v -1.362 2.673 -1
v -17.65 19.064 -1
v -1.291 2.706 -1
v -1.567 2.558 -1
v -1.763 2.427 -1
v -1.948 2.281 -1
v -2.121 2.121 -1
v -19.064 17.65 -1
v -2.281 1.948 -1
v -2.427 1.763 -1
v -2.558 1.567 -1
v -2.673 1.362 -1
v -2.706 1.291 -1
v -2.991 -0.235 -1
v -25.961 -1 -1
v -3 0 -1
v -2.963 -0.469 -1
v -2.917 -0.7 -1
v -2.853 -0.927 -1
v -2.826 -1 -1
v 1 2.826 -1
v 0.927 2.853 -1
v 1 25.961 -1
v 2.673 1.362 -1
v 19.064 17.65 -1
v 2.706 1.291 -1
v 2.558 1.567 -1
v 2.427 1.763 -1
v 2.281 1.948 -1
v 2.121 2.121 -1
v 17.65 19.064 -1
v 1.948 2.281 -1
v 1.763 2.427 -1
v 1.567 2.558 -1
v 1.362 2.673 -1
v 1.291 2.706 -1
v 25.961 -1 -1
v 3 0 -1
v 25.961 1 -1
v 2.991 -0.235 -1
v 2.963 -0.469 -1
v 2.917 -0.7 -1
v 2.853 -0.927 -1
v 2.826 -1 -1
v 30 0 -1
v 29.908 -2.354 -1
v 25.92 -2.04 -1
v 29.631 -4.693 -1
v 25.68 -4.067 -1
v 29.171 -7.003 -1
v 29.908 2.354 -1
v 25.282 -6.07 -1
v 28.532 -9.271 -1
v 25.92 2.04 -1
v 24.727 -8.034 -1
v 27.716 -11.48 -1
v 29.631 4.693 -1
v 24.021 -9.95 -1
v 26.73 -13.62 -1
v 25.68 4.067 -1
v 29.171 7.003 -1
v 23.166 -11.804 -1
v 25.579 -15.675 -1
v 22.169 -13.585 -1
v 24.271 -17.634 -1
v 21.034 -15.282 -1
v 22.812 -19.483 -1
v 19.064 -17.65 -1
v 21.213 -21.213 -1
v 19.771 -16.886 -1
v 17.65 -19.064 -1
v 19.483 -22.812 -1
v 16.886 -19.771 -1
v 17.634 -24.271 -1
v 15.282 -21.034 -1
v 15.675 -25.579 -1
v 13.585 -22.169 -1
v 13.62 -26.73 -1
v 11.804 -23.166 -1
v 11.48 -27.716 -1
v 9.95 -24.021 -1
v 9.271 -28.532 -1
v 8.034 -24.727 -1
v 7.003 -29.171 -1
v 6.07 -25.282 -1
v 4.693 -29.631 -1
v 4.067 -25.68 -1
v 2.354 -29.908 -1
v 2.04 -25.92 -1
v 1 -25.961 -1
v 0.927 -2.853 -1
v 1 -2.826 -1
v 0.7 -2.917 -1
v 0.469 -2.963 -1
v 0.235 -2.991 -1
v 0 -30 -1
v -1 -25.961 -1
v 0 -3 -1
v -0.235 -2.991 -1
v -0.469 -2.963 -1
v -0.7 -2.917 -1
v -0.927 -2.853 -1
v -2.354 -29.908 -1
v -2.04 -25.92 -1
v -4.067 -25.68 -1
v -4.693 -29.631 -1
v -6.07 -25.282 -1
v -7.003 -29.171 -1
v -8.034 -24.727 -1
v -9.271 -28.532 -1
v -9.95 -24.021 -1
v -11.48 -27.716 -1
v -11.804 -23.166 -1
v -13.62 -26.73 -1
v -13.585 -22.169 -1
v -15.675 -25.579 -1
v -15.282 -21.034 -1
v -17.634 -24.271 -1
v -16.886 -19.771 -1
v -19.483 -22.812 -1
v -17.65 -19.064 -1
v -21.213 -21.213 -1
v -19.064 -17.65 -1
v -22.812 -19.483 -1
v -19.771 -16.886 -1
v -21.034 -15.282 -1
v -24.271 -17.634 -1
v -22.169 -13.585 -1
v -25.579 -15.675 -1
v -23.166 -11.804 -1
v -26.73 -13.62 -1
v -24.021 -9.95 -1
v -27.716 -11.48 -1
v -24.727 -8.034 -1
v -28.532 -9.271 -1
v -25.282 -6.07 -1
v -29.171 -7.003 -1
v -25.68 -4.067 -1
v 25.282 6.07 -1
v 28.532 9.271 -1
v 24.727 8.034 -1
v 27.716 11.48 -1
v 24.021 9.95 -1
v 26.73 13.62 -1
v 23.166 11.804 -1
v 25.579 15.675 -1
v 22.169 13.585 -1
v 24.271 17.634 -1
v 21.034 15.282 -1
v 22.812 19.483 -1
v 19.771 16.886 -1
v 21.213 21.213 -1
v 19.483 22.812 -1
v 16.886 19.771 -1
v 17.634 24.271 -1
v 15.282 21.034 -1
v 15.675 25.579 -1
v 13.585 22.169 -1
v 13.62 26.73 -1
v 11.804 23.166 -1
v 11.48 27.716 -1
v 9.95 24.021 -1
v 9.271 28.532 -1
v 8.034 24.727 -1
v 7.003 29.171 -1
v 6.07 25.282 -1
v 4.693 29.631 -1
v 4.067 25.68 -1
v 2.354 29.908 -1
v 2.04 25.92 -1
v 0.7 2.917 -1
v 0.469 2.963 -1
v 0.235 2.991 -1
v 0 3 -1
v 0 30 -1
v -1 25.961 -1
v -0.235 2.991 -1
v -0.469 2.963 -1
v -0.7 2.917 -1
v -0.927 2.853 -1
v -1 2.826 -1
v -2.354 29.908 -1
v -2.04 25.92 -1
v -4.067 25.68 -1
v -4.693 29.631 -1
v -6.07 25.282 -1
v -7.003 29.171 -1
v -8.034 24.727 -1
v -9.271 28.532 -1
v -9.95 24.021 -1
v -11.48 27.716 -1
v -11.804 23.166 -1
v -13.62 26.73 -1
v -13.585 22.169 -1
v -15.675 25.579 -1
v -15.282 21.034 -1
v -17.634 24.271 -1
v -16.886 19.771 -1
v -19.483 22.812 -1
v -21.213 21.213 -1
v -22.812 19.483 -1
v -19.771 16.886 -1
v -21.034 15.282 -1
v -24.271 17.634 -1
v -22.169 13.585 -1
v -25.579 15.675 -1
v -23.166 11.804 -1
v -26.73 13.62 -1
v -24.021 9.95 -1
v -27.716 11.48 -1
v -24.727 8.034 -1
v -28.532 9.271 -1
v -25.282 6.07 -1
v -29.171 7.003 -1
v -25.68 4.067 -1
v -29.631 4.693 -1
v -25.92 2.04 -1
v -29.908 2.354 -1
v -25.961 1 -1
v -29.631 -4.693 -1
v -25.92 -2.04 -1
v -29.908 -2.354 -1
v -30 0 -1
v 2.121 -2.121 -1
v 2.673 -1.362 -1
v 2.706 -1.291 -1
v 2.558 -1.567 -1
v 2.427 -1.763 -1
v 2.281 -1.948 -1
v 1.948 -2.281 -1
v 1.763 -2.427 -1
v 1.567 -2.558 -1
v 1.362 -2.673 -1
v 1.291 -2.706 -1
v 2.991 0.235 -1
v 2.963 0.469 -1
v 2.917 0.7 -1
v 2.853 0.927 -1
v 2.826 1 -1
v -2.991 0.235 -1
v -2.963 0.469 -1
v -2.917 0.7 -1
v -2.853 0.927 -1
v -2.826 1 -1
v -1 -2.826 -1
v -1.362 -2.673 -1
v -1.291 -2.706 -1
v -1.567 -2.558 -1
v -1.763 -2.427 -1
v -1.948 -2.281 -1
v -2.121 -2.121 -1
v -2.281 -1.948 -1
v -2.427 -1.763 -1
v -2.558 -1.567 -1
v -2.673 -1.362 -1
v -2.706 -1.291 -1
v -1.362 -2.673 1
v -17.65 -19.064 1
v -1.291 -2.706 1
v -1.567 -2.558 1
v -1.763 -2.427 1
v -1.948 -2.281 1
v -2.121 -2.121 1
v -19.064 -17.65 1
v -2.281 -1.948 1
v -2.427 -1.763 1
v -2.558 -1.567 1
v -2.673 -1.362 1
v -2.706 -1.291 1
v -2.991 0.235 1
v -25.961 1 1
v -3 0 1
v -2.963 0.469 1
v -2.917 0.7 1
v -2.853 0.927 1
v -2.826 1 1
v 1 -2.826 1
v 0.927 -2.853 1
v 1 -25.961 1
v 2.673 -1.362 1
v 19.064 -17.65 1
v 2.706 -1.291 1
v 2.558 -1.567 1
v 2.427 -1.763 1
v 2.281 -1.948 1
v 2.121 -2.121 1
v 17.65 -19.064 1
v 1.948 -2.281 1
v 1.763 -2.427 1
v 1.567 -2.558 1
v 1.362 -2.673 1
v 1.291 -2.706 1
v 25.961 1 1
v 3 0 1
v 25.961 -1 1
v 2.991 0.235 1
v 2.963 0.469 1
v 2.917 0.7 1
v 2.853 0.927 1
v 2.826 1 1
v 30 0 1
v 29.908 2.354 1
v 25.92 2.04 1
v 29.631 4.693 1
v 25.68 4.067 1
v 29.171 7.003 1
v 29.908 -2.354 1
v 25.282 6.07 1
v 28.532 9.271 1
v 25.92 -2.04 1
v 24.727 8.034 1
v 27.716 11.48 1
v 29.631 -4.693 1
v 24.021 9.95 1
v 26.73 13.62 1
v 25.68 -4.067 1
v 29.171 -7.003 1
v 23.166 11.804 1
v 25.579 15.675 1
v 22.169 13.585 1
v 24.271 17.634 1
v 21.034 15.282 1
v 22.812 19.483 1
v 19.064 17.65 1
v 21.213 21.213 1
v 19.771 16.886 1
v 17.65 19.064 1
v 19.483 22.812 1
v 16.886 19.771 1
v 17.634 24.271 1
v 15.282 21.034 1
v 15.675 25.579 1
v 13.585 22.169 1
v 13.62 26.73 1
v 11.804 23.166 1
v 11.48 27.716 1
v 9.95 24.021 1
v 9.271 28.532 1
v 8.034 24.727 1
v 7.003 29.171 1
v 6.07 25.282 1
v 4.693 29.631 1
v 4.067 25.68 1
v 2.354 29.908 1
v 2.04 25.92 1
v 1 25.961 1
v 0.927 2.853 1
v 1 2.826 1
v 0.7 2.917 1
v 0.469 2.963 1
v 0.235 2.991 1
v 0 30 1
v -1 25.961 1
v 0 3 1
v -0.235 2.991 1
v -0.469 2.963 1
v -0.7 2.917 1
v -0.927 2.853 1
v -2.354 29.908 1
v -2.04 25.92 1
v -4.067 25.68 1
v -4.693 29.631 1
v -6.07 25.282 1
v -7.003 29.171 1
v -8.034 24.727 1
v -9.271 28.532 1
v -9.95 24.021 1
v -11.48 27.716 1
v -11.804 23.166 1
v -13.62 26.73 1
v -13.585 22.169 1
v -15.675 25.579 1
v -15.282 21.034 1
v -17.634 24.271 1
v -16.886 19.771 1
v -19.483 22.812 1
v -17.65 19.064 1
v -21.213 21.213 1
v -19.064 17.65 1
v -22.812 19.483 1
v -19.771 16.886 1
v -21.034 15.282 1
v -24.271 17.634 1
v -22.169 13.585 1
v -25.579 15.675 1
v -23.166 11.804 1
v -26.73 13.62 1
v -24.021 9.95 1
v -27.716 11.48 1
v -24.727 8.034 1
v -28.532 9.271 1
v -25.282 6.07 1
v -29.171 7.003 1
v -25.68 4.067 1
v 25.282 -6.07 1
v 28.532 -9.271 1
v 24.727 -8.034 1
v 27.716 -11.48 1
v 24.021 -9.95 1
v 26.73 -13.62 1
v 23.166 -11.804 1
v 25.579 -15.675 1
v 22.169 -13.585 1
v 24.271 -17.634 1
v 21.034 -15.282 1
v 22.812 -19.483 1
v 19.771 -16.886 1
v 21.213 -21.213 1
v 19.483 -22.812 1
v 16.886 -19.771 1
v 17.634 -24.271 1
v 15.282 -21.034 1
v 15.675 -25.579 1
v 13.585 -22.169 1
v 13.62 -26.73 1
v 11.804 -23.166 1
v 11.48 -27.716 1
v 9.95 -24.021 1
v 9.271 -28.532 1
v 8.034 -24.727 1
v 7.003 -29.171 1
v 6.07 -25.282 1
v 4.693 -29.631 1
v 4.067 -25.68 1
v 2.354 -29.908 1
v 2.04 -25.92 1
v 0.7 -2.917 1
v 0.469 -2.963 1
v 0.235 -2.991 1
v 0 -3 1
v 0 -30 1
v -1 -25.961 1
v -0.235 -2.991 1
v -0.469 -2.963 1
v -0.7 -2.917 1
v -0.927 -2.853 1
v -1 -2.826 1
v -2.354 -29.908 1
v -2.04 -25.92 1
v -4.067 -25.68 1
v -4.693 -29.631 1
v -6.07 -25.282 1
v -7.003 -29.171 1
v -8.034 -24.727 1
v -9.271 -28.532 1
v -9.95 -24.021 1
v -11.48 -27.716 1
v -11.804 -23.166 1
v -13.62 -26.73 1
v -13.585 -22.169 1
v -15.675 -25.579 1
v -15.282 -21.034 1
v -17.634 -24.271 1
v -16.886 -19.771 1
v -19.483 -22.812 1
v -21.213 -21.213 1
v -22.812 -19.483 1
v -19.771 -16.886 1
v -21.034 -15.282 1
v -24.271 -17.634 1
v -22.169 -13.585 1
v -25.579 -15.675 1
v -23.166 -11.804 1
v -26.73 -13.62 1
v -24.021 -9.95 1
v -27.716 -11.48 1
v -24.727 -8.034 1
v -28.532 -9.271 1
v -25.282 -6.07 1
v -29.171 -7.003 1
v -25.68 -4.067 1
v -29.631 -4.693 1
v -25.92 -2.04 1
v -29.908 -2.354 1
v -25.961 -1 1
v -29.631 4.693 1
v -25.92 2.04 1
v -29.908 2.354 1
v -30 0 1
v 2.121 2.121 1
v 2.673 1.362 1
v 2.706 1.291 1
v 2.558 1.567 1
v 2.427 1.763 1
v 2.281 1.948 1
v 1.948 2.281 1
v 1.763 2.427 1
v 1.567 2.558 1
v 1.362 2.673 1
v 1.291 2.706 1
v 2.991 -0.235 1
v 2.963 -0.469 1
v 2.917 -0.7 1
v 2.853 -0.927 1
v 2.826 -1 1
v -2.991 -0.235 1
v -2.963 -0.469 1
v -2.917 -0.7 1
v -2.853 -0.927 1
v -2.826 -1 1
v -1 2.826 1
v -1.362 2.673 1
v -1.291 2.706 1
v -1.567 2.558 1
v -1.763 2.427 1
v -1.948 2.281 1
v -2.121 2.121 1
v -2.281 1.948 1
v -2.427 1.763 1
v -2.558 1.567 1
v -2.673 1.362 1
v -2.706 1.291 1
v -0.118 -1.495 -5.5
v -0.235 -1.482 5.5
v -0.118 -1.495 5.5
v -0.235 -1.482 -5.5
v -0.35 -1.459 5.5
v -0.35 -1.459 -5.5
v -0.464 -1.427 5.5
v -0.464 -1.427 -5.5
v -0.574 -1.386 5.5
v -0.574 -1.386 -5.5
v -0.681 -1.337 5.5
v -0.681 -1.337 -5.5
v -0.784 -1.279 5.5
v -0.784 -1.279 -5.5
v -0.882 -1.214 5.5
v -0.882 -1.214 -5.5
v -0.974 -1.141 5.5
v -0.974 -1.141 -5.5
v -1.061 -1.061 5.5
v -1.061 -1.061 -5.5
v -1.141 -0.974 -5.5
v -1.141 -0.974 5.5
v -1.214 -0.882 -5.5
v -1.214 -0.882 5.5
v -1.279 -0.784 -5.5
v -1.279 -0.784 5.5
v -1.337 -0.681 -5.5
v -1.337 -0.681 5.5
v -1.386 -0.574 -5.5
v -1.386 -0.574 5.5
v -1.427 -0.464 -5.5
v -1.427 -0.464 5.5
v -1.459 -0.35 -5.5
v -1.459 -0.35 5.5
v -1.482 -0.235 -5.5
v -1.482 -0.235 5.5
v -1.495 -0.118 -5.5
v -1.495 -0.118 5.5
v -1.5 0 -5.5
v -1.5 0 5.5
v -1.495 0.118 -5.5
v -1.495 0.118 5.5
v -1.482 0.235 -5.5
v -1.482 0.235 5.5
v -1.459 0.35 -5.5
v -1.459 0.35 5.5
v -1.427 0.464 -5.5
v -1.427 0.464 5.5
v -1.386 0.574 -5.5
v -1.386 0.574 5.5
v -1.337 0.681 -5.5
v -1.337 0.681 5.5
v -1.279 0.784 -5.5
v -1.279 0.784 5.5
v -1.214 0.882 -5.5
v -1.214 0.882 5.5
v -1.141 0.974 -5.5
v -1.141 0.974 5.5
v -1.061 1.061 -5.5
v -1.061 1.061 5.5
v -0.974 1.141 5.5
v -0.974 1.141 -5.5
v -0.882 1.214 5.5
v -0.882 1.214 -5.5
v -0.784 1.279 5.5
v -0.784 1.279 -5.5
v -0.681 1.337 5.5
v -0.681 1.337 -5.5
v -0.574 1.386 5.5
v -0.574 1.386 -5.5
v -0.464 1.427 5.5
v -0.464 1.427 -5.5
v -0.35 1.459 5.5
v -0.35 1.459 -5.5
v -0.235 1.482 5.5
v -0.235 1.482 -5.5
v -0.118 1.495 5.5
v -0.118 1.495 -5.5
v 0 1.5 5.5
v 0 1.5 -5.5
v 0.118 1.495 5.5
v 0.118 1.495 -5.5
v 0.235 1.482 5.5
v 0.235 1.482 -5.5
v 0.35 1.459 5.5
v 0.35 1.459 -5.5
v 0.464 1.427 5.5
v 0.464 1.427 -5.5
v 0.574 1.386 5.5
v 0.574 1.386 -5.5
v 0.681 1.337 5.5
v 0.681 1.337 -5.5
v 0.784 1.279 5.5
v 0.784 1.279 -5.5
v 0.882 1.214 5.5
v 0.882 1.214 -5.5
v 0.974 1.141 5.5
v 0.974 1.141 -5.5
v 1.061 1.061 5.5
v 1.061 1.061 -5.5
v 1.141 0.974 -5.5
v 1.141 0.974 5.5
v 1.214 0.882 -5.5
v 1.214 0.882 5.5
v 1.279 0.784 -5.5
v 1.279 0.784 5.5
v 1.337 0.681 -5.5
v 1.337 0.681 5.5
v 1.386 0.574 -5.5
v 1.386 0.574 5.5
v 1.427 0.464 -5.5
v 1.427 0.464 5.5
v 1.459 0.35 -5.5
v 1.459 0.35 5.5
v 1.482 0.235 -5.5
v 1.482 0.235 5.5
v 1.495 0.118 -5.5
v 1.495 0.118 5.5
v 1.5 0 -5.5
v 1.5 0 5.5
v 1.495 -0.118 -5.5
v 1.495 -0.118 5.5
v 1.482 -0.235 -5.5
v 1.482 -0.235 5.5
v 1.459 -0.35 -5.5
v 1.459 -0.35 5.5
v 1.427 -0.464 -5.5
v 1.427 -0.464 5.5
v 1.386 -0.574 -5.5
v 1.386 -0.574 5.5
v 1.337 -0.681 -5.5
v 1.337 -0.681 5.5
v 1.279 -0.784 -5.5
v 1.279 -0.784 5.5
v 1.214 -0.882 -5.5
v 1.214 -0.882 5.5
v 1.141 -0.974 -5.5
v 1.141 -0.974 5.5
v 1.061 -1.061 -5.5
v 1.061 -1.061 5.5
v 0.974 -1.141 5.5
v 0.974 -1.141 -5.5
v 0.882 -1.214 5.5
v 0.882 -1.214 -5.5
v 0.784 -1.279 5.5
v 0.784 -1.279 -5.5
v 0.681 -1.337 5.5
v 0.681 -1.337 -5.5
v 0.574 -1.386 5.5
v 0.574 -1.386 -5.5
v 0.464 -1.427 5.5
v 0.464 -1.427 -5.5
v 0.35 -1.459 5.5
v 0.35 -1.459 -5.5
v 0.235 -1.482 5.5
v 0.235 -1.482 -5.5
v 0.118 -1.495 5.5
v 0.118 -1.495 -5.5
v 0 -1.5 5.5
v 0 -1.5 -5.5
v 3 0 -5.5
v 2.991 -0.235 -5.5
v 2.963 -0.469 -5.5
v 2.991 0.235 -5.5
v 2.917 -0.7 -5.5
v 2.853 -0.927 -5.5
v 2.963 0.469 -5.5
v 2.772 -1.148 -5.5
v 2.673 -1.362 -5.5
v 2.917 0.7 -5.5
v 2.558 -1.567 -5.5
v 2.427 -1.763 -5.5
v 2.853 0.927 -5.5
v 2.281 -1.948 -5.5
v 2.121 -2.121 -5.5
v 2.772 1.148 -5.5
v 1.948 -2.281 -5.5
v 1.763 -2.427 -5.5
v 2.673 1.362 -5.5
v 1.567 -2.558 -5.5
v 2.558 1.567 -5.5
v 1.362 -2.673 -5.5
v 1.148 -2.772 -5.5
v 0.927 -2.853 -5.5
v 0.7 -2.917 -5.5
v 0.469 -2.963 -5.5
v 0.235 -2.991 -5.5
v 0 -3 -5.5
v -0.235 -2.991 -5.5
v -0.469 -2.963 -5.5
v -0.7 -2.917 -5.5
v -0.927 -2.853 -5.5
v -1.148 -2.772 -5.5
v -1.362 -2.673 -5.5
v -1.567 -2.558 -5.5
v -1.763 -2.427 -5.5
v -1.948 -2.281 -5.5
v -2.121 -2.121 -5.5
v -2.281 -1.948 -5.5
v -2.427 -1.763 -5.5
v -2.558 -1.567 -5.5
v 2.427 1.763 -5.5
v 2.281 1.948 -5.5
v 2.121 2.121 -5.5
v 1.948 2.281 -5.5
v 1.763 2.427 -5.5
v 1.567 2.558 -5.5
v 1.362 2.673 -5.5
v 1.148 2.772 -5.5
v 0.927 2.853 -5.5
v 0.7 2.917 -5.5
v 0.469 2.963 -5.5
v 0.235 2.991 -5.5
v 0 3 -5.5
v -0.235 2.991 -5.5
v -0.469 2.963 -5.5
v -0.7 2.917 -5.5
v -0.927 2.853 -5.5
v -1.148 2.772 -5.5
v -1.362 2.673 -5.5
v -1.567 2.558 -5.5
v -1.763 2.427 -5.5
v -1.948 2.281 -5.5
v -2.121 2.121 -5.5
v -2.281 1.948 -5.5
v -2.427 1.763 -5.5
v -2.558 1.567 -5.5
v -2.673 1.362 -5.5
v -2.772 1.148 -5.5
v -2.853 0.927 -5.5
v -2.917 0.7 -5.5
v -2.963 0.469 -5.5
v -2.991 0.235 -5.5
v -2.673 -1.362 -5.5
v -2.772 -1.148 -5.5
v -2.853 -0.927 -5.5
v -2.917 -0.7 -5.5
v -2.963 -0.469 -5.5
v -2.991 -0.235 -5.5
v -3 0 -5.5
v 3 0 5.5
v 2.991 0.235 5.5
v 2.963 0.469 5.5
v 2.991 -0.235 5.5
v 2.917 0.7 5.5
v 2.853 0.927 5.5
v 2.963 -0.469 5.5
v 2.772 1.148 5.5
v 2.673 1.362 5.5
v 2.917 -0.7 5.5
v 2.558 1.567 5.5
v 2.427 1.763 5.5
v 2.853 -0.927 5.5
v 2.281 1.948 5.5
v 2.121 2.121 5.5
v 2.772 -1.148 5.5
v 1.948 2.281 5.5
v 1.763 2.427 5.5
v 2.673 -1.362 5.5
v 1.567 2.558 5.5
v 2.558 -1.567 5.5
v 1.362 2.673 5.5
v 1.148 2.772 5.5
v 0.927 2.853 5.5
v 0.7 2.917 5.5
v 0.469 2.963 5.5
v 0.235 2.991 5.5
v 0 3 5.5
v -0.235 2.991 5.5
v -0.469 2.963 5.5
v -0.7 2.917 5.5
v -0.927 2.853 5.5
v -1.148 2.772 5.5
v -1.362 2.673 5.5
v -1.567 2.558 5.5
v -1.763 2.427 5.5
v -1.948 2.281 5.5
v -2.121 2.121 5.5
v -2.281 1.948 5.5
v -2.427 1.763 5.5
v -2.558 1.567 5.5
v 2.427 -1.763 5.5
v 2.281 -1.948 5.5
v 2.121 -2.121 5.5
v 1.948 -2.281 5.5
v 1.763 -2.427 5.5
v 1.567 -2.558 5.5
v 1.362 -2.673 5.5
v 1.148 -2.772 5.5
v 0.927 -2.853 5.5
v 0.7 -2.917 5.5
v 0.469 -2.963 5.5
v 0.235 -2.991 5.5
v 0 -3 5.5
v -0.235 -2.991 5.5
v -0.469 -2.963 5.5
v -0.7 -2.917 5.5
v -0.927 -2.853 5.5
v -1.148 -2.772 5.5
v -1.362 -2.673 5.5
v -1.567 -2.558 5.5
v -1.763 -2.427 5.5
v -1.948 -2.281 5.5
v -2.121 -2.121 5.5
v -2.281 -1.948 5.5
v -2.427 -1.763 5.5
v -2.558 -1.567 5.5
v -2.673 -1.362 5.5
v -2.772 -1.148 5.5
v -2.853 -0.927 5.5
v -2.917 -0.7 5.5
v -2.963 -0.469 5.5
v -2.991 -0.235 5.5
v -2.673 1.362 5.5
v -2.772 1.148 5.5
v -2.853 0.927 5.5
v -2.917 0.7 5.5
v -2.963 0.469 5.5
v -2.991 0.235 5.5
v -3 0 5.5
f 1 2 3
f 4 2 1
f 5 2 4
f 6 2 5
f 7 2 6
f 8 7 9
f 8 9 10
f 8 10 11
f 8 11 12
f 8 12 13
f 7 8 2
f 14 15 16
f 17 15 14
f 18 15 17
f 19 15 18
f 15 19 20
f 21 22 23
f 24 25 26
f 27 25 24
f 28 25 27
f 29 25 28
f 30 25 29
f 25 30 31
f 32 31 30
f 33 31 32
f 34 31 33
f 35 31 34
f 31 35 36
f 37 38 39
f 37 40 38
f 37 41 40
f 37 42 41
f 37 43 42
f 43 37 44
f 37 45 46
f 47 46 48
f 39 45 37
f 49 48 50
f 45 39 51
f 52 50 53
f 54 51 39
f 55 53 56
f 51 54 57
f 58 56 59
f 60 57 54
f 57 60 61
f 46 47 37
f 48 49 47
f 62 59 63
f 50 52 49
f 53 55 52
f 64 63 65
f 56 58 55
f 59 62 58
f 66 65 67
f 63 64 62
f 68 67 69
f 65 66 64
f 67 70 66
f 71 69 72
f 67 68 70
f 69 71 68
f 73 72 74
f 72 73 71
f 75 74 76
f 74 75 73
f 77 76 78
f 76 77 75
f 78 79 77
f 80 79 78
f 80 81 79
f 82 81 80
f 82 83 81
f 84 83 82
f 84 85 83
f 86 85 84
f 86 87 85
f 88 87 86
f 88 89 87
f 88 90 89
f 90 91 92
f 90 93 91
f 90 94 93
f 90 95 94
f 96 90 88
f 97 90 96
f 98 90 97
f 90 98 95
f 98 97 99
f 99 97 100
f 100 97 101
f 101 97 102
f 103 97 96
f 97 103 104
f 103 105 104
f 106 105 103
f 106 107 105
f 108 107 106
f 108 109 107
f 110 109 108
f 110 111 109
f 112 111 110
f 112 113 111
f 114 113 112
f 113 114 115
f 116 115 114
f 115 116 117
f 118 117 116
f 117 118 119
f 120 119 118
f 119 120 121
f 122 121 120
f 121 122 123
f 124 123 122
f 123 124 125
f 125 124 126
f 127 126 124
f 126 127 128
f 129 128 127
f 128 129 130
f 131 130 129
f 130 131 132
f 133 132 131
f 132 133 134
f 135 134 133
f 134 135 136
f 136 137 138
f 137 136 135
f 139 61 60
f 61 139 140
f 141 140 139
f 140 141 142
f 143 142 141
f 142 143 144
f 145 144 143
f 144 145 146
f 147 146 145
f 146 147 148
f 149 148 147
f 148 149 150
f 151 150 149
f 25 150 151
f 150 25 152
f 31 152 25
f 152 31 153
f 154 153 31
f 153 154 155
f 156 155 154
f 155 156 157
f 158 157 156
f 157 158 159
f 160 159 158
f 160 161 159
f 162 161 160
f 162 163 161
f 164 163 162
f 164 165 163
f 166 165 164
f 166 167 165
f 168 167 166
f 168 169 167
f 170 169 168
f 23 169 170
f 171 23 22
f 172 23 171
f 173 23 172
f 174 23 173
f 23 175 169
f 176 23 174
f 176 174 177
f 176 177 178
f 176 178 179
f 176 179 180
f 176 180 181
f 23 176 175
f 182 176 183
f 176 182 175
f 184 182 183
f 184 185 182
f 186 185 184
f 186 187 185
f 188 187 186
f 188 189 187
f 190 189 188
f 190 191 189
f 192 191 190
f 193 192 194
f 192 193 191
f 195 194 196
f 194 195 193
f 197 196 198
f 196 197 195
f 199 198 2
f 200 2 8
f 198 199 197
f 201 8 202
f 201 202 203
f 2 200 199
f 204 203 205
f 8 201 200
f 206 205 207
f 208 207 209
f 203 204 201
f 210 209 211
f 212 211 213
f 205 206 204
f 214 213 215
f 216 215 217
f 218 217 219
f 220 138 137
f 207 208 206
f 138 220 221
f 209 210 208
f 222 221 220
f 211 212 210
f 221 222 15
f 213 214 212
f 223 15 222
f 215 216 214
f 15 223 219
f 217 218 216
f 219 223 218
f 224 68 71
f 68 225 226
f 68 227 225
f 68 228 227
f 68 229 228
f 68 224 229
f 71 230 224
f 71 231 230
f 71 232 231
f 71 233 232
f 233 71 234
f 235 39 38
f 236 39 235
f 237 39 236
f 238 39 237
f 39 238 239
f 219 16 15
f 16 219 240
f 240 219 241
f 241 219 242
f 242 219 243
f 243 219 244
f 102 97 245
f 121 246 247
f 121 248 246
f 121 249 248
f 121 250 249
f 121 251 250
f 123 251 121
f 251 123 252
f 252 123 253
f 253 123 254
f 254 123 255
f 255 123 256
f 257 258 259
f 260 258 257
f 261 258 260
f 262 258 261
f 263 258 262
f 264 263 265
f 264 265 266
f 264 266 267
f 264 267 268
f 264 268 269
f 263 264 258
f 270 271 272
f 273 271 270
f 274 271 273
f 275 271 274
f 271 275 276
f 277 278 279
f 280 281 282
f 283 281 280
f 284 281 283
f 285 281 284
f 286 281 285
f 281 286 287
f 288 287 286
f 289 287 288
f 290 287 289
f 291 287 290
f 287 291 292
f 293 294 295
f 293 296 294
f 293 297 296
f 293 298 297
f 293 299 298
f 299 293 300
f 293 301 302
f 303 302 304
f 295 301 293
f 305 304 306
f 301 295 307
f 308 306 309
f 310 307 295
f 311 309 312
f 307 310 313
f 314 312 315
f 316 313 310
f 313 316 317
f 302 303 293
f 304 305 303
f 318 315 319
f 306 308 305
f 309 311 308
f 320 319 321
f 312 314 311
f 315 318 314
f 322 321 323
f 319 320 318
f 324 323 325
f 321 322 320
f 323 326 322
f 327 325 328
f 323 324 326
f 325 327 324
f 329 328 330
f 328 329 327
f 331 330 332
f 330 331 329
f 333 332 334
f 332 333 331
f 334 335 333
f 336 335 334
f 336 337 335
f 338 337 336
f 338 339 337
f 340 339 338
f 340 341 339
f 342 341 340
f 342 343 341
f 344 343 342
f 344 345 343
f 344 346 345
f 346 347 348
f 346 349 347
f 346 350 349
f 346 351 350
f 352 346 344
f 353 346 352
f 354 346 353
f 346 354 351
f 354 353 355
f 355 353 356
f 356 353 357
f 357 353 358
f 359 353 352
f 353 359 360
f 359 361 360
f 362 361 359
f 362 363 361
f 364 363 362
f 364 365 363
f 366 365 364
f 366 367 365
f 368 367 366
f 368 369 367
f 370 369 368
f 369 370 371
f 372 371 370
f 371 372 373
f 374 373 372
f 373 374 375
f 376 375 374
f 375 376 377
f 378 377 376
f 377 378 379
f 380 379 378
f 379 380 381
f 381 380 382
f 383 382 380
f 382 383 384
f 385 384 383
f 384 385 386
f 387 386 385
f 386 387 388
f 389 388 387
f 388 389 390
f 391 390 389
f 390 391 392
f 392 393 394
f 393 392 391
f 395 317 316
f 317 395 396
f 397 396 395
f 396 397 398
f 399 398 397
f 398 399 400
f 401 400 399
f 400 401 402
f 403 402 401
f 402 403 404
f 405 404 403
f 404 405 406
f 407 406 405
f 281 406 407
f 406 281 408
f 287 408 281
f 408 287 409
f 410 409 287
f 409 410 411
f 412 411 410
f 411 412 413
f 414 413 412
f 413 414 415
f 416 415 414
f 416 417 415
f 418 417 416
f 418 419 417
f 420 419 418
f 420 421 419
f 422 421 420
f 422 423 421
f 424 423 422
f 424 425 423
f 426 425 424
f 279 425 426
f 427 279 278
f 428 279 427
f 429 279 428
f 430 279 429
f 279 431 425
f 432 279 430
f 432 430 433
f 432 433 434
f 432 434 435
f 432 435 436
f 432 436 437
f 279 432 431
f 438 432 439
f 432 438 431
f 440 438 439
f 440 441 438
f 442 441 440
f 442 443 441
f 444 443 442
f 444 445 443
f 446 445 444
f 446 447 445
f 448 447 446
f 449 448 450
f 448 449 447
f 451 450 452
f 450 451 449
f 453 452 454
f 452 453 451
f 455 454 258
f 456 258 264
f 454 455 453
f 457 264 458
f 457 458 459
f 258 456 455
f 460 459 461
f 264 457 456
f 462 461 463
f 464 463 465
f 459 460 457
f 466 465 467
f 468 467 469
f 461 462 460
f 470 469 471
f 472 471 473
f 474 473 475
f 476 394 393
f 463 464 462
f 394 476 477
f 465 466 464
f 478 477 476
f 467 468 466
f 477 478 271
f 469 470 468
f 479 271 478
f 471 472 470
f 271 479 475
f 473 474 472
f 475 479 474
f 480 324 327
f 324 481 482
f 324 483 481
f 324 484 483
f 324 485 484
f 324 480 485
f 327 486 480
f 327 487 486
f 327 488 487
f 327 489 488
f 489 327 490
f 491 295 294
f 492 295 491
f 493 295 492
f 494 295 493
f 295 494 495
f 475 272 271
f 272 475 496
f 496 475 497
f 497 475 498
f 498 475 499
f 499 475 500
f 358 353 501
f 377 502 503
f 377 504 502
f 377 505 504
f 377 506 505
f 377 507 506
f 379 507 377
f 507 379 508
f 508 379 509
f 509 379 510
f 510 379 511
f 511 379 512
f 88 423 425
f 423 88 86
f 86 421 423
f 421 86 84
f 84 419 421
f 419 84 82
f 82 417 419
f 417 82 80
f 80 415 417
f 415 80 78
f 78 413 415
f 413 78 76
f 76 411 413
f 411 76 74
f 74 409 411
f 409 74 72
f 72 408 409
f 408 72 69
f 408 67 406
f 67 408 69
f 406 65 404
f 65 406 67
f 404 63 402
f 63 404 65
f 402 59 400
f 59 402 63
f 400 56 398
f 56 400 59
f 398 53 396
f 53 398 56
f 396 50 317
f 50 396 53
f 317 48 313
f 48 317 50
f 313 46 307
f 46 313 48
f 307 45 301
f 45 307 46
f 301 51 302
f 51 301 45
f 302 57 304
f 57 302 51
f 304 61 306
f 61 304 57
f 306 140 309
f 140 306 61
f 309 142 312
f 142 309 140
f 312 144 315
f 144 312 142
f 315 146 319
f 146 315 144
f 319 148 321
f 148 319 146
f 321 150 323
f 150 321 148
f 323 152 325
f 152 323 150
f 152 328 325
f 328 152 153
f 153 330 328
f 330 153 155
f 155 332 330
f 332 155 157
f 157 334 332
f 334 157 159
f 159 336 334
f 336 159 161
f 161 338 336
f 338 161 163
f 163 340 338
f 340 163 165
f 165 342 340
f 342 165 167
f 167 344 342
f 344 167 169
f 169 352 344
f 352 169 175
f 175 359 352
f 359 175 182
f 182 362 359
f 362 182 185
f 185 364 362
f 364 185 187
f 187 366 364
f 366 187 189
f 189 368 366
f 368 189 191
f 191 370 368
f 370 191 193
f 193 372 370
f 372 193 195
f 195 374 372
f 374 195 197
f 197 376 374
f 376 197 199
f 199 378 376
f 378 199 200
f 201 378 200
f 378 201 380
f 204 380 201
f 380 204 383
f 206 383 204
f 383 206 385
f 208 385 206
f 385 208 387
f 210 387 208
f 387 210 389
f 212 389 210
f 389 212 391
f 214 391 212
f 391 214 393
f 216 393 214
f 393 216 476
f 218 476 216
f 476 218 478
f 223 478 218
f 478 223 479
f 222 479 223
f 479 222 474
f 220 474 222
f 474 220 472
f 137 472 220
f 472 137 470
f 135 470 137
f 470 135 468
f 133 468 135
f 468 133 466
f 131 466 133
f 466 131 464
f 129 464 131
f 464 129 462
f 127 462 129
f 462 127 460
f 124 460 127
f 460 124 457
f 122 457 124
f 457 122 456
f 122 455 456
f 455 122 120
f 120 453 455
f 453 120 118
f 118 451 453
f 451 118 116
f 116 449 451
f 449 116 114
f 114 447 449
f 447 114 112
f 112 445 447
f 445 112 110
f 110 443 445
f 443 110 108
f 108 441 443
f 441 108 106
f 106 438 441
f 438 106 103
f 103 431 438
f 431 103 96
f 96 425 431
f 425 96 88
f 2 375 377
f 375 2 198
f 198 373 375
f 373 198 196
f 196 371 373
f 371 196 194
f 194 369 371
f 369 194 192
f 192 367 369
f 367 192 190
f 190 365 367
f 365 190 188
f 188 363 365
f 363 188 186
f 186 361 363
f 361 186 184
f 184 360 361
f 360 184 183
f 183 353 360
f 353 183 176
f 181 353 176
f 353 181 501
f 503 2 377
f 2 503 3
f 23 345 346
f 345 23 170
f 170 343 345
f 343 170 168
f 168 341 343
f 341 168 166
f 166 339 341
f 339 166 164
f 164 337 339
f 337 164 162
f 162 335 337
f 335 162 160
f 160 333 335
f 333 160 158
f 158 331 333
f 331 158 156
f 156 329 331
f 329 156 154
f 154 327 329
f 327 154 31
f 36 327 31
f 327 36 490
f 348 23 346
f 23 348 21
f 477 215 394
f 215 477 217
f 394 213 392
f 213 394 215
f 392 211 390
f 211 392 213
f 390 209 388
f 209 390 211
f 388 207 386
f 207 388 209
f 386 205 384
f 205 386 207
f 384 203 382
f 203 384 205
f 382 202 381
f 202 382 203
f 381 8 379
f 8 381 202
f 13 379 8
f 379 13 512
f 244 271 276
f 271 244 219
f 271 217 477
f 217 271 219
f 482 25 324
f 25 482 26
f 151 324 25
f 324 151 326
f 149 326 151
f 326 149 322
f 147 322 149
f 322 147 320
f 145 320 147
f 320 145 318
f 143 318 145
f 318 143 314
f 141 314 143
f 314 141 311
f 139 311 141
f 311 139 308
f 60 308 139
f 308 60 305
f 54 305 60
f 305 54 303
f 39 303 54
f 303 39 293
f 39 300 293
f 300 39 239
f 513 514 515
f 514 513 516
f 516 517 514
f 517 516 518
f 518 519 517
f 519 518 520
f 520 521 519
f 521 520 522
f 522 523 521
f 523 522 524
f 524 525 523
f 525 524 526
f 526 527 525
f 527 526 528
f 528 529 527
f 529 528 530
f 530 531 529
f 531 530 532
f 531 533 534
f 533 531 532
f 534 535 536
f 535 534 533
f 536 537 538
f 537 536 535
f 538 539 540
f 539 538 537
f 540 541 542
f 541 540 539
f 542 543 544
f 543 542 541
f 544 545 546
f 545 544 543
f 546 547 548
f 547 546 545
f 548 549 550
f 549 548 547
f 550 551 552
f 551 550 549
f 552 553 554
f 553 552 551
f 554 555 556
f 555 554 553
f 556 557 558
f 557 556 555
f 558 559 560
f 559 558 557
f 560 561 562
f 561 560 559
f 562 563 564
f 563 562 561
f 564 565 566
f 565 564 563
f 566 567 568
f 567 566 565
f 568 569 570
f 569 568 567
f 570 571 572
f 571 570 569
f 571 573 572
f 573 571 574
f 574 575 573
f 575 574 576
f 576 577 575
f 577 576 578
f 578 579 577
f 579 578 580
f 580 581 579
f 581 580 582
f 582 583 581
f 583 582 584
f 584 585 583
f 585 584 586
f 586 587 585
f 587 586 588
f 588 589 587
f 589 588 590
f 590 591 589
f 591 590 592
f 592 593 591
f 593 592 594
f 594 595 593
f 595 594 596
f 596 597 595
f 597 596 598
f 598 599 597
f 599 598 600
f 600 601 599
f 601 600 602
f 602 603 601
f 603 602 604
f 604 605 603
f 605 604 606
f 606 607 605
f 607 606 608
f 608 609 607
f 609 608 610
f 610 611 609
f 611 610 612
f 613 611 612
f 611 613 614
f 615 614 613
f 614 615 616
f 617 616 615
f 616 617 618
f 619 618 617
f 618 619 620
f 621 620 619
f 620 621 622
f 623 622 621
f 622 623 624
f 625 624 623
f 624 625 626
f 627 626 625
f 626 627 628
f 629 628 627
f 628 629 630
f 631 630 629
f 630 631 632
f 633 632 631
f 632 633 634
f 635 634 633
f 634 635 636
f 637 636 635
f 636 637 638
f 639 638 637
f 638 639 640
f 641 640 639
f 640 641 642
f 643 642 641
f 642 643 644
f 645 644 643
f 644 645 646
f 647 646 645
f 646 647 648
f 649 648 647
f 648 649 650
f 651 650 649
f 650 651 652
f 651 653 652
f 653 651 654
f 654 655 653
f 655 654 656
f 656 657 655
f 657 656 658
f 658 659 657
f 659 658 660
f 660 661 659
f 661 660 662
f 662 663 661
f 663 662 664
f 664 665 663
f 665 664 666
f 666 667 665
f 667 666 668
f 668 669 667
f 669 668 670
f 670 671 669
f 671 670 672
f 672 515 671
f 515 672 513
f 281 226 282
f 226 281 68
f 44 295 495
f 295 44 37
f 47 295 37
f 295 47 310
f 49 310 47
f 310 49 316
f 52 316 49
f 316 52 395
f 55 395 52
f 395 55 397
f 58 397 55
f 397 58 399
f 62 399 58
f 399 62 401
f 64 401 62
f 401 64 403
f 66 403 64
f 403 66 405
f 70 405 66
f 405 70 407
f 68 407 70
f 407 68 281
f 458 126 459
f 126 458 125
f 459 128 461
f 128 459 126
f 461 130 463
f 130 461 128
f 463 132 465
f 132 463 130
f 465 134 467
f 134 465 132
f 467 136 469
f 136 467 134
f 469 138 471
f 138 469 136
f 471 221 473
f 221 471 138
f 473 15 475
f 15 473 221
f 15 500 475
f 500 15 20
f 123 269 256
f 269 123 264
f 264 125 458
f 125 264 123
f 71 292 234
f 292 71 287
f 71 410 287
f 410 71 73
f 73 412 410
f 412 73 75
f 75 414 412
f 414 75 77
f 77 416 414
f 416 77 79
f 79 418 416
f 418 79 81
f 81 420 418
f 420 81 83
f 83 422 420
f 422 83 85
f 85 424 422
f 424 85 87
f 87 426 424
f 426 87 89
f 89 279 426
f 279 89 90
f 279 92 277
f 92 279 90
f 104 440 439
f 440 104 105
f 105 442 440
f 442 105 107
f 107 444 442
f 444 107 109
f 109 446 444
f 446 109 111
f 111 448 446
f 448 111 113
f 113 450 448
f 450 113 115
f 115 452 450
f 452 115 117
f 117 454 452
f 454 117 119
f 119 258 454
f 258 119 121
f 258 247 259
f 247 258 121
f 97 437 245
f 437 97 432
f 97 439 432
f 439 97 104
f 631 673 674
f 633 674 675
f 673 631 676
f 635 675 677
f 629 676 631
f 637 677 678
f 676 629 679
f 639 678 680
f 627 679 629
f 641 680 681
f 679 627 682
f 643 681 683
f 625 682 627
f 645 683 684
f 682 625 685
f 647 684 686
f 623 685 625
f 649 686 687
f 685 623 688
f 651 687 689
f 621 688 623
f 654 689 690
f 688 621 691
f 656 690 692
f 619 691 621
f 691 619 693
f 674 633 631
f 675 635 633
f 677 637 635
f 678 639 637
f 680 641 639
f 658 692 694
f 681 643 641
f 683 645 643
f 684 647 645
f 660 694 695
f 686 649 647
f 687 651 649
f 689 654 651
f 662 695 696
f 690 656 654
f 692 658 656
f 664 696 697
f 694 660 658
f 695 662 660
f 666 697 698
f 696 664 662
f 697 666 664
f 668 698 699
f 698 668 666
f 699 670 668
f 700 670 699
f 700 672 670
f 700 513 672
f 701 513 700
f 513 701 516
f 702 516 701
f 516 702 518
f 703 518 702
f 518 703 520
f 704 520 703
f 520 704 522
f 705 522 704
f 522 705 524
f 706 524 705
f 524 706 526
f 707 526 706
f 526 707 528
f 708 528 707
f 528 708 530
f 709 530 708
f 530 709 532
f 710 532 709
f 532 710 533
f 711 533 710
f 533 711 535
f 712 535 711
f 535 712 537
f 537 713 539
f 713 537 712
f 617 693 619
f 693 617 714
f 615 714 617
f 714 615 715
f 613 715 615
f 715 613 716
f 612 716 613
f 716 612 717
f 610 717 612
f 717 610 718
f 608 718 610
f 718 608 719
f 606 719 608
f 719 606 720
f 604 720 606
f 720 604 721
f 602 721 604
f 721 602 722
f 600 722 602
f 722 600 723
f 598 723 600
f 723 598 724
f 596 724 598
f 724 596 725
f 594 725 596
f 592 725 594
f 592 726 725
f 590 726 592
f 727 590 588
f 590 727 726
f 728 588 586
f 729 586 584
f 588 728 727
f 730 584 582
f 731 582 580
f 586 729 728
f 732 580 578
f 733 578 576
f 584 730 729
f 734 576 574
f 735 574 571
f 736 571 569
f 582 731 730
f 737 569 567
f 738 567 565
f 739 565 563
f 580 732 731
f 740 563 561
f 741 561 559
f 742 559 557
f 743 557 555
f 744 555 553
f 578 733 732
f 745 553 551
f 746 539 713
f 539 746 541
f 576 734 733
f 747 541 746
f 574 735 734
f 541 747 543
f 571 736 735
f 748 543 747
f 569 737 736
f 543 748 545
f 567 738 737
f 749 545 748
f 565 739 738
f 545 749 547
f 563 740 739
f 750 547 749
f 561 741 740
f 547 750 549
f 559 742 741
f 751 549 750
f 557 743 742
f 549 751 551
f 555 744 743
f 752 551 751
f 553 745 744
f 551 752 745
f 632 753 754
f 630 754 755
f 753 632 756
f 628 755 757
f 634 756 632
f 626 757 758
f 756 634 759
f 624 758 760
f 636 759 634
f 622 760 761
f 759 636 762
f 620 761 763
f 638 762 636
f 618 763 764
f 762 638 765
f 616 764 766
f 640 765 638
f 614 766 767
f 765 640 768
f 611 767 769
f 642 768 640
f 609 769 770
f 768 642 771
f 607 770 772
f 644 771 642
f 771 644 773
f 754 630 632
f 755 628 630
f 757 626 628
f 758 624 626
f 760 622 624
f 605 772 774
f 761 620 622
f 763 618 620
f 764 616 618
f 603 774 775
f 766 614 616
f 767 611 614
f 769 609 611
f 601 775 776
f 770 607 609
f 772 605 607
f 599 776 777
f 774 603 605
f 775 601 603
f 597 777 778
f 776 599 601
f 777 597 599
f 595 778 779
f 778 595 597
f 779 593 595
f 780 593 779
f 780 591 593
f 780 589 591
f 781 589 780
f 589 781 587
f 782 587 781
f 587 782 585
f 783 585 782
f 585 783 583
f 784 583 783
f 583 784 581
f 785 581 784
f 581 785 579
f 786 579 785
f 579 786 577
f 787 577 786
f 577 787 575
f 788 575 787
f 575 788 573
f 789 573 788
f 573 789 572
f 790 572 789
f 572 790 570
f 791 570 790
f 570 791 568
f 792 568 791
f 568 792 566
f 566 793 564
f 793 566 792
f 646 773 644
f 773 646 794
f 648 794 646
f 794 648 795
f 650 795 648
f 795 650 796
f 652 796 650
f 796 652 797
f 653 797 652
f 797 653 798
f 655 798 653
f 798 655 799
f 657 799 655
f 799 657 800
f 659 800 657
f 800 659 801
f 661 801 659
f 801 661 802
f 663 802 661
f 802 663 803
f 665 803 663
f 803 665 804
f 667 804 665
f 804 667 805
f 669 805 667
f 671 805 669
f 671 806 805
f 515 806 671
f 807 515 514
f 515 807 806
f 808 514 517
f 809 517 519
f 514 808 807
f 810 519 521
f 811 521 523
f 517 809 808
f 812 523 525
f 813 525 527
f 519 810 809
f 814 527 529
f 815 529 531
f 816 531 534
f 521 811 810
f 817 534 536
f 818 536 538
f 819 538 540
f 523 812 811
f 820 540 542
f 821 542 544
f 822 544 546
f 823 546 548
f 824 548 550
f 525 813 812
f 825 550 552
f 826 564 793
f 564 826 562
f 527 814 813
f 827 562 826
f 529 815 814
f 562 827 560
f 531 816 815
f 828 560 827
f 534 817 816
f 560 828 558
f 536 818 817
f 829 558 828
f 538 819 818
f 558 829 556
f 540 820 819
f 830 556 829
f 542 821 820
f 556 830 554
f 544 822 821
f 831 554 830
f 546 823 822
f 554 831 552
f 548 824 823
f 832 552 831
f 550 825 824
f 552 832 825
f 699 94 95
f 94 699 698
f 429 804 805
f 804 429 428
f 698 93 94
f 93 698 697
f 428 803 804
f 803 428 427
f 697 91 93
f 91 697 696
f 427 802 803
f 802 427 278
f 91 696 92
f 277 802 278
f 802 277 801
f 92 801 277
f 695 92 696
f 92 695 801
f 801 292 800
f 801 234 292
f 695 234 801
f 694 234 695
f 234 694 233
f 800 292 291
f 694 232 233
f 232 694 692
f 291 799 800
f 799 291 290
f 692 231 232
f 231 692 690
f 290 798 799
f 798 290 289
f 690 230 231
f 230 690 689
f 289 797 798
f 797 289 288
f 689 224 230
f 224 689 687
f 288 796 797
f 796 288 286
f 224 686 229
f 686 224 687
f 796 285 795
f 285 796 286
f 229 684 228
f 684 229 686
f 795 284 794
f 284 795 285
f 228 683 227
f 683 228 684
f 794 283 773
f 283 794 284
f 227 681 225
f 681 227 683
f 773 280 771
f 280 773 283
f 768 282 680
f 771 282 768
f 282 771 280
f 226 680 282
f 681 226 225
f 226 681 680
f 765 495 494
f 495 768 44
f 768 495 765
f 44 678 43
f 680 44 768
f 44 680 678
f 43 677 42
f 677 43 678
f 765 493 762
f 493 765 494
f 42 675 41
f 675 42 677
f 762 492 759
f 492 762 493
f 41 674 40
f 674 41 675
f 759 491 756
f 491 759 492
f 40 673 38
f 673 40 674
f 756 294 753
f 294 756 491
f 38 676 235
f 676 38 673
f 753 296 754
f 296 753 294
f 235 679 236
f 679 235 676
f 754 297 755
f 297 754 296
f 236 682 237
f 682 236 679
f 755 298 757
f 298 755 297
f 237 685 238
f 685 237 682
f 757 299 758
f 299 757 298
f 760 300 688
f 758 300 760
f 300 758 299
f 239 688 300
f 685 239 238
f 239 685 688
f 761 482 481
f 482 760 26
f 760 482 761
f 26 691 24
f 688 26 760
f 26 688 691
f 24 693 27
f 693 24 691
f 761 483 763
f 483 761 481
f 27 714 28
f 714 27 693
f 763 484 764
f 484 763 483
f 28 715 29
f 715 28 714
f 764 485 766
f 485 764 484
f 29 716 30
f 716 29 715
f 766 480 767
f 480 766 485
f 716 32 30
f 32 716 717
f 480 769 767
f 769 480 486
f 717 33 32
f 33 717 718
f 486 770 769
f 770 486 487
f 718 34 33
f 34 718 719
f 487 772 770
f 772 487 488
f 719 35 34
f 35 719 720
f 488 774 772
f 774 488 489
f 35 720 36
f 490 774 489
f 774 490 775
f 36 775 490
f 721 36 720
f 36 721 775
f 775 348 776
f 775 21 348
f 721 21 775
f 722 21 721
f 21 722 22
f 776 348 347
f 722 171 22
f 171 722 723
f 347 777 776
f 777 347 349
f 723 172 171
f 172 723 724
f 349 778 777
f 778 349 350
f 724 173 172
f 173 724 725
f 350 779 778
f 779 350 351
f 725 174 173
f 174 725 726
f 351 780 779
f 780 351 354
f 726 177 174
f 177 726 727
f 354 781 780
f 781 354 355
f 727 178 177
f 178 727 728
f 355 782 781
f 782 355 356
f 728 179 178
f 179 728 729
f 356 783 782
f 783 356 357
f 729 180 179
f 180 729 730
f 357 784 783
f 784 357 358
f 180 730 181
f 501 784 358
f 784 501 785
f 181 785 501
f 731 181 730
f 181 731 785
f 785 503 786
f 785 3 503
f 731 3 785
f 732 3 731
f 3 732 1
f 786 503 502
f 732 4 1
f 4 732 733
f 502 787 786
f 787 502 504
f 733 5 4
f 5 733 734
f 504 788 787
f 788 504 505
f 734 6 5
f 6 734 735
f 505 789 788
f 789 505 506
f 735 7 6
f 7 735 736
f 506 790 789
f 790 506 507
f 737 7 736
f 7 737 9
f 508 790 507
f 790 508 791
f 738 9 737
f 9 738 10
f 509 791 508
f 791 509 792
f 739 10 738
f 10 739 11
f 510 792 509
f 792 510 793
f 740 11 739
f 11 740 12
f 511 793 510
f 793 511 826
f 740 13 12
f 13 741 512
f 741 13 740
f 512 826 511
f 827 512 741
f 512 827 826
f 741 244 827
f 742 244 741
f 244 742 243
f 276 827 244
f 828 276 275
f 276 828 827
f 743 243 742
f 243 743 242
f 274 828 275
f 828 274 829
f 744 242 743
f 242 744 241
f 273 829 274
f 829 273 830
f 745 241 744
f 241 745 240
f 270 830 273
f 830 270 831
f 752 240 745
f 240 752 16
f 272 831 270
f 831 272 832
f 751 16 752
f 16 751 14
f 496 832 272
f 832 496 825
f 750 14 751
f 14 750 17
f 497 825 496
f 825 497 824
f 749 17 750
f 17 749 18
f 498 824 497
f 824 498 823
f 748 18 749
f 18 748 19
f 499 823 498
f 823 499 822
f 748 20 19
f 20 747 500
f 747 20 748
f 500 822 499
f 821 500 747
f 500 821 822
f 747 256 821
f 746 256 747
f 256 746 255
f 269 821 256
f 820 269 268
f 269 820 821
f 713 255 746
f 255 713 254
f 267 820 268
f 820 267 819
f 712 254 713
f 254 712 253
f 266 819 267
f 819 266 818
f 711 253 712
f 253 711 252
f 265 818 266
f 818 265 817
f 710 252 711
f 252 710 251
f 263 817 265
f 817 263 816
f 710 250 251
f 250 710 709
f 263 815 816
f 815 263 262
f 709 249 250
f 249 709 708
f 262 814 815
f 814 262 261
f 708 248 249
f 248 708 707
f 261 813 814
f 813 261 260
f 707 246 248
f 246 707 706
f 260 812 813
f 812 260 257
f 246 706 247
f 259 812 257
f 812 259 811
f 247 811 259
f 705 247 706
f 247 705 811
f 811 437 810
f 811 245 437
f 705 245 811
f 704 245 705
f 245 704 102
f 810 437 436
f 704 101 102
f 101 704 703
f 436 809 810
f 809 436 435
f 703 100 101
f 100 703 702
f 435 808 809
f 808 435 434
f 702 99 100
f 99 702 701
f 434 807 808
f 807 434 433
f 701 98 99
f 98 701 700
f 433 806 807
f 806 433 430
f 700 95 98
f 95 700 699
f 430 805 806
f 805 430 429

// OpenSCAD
//!OpenSCAD







linear_extrude( height=2, twist=0, scale=[1, 1], center=true, $fn=80){
    wheel();
}

linear_extrude( height=11, twist=0, scale=[1, 1], center=true, $fn=80){
   hook();
}


module hook(){
    difference(){
    circle(d=6);
    circle(d=3);
    }
    
}


module wheel(){
union(){
    difference() {
        difference() {
            circle(r=30);

            circle(d=3);
    }

    difference() {
            circle(r=26);

            circle(d=5);
    }
    }
        for (i = [0 : abs(45) : 360]) {
            rotate([0, 0, i]){
            translate([2, -1, 0]){
            square([26, 2], center=false);
         }
    }
    }
}
}
